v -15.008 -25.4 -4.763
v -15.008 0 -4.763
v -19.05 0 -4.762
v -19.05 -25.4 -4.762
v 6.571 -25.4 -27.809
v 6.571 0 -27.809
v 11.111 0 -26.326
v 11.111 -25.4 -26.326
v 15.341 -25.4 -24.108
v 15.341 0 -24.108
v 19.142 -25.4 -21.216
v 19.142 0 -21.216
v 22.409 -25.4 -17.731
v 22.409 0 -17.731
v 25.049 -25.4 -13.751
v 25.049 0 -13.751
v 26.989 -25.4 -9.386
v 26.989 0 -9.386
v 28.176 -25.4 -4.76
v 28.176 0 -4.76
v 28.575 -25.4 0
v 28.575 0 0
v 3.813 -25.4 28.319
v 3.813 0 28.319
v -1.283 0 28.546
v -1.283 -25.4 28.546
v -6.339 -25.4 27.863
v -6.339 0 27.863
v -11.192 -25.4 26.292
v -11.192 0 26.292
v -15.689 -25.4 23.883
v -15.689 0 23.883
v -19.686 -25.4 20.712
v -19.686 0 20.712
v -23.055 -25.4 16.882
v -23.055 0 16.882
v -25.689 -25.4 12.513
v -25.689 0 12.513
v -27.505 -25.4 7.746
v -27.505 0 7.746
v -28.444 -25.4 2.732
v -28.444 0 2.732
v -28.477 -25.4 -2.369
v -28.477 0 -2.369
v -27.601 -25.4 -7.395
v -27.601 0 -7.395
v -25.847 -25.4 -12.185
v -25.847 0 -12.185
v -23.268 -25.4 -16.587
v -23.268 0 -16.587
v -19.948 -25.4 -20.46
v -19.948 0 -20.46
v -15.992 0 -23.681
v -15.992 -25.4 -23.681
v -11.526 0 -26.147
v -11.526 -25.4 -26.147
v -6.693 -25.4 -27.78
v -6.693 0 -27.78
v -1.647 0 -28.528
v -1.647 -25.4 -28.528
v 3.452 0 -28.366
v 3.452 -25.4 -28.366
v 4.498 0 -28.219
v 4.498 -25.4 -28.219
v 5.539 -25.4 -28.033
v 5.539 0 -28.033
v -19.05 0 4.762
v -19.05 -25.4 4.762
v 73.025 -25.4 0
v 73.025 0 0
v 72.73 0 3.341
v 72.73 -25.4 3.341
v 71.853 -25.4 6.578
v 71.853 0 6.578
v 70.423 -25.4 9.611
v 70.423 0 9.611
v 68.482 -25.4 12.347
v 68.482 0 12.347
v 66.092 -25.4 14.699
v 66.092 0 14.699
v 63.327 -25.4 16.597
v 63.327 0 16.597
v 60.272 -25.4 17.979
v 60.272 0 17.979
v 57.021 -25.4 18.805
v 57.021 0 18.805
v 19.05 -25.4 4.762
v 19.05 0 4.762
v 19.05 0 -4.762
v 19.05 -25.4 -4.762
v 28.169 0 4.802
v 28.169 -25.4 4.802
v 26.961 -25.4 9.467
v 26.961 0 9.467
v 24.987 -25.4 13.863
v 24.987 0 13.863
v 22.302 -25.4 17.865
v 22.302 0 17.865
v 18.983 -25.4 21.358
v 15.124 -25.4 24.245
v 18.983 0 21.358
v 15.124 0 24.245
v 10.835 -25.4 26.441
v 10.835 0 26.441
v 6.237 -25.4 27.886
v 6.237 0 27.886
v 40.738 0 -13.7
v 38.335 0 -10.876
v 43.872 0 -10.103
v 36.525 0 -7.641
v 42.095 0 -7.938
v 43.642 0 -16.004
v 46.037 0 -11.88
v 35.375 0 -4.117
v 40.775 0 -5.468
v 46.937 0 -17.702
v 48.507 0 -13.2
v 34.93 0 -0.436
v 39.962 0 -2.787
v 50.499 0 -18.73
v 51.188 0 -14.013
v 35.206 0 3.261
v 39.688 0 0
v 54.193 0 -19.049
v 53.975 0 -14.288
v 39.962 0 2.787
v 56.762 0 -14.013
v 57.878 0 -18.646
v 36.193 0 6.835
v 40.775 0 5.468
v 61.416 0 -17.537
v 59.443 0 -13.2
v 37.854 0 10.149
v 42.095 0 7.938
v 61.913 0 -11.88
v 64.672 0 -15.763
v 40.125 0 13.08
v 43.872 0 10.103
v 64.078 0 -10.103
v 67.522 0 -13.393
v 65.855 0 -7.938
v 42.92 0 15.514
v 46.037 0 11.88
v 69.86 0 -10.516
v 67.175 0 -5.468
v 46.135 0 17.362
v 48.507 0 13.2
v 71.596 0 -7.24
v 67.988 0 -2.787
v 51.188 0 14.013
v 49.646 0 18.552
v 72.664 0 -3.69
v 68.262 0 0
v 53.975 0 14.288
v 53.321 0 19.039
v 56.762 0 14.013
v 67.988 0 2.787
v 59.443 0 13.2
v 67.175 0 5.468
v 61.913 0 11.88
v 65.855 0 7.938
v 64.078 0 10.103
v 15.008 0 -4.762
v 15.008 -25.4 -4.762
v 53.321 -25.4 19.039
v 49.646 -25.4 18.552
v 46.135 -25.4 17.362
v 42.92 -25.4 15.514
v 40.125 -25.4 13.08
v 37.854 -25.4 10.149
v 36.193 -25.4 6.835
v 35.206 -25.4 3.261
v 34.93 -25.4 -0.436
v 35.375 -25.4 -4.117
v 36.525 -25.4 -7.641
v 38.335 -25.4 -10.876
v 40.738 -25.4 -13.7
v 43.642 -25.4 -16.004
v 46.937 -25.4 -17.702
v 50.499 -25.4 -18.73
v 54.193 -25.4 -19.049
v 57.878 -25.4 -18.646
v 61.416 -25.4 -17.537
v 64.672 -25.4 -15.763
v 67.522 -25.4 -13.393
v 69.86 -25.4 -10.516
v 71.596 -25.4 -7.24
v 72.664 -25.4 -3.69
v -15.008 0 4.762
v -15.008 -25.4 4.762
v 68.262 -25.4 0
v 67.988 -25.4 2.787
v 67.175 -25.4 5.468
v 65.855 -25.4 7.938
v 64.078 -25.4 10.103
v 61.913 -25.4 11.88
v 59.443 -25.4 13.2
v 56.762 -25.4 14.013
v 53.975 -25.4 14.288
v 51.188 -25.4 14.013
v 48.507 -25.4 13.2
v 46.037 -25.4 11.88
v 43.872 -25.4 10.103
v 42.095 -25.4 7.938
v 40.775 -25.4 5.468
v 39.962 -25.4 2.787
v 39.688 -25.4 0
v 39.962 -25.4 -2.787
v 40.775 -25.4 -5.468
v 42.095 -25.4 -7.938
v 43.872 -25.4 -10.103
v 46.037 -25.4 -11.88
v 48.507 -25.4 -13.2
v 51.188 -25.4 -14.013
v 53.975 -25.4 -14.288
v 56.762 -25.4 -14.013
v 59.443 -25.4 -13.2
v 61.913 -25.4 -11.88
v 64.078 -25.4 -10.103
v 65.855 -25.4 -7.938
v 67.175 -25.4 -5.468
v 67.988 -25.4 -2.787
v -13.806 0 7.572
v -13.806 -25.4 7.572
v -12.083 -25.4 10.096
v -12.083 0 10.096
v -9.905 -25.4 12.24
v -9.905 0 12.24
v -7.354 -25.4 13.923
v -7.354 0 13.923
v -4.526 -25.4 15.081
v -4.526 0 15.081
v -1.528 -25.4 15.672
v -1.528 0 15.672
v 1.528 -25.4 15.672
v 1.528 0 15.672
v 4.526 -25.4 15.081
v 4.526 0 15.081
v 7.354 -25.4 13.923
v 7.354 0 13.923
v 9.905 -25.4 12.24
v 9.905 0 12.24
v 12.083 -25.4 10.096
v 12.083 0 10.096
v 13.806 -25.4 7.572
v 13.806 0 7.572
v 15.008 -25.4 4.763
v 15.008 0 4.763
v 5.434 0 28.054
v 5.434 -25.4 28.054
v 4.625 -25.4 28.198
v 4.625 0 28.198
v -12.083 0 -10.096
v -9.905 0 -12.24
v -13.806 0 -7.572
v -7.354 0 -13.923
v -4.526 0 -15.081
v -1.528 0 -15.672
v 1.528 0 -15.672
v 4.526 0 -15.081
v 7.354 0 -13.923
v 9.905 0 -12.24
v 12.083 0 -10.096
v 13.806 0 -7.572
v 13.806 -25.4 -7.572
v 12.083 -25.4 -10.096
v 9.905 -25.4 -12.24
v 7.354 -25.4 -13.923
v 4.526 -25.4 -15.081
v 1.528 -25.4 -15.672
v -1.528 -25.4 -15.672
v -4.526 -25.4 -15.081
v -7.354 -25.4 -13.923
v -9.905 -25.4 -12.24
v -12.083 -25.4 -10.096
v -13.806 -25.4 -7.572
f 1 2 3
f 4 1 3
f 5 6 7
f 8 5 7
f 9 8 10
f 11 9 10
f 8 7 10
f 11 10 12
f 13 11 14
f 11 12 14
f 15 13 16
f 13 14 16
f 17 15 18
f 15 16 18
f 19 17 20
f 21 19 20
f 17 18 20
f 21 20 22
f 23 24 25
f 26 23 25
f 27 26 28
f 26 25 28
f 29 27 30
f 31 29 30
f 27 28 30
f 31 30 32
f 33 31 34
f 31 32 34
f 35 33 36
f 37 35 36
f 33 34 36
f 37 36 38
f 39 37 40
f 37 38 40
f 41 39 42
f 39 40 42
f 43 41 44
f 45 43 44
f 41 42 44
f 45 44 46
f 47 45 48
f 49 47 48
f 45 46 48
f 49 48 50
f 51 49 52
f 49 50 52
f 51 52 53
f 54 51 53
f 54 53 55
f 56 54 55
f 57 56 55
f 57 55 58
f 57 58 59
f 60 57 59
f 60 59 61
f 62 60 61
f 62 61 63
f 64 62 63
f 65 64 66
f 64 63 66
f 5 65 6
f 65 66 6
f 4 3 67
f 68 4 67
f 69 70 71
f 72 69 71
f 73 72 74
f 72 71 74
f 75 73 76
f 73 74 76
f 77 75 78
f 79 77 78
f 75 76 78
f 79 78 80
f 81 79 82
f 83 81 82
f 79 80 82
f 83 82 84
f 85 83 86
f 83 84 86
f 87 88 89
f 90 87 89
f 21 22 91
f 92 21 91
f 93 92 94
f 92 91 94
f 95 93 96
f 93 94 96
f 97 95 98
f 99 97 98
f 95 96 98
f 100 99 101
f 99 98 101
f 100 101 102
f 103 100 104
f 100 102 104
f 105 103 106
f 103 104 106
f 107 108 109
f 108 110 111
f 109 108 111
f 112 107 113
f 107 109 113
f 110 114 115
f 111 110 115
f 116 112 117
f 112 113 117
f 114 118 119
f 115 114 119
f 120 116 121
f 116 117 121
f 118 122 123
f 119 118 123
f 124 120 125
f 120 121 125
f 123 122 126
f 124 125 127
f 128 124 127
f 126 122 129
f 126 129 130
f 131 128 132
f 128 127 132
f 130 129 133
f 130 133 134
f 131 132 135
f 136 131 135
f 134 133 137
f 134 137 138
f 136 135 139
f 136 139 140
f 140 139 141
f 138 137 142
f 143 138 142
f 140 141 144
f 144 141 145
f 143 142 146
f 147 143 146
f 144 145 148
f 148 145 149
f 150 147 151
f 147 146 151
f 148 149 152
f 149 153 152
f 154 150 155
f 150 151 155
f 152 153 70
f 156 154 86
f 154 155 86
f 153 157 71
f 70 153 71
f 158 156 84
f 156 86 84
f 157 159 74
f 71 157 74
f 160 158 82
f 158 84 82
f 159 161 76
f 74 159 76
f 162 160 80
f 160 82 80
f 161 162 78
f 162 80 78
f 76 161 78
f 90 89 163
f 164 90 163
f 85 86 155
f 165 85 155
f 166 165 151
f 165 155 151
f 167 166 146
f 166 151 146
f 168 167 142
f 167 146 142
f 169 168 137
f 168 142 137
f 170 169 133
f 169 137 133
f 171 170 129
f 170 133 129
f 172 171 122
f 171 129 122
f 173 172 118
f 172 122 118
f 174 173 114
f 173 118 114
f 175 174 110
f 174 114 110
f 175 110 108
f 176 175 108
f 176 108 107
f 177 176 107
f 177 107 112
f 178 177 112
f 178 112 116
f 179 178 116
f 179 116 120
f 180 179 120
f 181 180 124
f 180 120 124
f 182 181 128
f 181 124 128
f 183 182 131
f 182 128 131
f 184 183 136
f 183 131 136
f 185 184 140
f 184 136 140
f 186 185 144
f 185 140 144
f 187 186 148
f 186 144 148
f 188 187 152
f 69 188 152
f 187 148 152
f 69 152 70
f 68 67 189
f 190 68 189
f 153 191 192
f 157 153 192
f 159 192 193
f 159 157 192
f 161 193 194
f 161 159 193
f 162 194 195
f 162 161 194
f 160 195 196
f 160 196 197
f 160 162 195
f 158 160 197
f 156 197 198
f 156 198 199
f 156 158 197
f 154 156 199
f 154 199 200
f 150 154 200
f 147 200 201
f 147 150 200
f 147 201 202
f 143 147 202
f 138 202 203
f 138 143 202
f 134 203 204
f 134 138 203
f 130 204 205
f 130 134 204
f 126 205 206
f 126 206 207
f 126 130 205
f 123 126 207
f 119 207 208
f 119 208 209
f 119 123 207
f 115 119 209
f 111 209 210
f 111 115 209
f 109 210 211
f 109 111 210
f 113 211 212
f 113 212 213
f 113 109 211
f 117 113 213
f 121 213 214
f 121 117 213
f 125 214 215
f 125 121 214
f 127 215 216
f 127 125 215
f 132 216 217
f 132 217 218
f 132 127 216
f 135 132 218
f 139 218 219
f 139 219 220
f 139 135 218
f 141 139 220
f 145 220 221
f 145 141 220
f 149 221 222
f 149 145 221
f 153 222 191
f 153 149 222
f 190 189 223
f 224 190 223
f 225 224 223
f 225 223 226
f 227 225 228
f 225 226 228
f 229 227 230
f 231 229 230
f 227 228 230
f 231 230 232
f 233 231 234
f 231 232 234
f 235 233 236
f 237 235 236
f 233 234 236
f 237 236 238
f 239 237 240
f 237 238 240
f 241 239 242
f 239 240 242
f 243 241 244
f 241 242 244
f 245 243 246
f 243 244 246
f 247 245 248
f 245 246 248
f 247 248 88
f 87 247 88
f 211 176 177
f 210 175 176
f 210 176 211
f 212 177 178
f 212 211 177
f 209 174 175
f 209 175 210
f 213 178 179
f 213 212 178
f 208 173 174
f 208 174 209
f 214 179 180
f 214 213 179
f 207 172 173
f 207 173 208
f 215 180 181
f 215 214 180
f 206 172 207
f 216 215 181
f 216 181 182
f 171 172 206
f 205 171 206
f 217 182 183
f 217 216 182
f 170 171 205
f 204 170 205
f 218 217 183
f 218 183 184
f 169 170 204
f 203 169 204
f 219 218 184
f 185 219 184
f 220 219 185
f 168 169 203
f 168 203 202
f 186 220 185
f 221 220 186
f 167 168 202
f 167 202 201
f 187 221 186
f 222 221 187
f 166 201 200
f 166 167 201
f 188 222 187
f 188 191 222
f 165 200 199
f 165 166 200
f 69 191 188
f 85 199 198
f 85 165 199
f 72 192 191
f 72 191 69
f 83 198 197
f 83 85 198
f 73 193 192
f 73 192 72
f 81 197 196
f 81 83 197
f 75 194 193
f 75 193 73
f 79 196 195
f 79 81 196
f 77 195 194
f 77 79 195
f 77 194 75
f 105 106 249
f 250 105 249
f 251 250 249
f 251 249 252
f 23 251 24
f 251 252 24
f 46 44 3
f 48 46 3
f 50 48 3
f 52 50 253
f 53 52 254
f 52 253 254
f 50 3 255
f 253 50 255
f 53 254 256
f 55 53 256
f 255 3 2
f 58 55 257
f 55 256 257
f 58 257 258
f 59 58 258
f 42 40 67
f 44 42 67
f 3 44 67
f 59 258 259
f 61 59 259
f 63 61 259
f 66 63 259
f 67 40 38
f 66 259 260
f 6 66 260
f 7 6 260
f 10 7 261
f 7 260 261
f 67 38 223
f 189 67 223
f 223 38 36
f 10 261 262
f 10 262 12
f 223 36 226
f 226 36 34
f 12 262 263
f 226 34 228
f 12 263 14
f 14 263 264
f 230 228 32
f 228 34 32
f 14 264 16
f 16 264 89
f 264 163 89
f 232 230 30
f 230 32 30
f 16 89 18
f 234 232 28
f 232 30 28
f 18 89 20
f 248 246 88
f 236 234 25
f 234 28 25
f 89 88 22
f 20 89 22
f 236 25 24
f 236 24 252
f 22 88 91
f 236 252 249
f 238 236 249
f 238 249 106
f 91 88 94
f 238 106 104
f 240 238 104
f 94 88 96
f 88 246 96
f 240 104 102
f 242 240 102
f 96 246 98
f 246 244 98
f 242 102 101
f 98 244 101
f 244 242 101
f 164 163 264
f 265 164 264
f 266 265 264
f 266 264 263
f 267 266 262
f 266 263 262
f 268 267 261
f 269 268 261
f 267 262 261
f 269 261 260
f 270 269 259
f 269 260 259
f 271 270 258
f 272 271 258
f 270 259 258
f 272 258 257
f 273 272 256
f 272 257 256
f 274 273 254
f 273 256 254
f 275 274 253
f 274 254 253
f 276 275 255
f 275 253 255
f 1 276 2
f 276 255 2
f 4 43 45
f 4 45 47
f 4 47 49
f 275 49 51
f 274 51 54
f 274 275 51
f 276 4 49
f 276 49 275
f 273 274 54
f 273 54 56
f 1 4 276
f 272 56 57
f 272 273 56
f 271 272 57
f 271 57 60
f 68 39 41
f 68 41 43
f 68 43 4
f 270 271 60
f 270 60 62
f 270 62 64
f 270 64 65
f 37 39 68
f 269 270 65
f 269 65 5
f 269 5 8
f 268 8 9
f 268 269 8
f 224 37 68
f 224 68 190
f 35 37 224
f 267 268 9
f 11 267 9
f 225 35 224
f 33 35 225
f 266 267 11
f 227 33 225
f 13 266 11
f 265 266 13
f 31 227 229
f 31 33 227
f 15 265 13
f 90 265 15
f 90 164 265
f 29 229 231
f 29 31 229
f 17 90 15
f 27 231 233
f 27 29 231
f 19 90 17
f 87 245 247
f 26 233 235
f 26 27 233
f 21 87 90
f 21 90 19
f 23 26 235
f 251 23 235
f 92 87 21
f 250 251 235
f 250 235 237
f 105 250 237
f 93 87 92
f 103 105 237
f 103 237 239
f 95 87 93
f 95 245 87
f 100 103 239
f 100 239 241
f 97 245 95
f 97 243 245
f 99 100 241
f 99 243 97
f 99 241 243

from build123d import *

# Parameters (mm, degrees)
F0_R     = 14.2875
F1_DEPTH = 25.4


with BuildPart() as f1:
    # F0 (on Front) → F1 (new body)
    with BuildSketch(Plane.XZ):
        with BuildLine():
            Line((6.237397, 27.885937), (3.813149, 28.319437))
            ThreePointArc((3.813149, 28.319437), (-28.574421, 0.181936), (3.452229, -28.365697))
            Line((3.452229, -28.365697), (6.571103, -27.809193))
            ThreePointArc((6.571103, -27.809193), (22.408703, -17.730783), (28.575, 0))
            ThreePointArc((28.575, 0), (22.302065, 17.864728), (6.237397, 27.885937))
        make_face()
        with BuildLine():
            ThreePointArc((-15.008458, 4.7625), (0, 15.745959), (15.008458, 4.7625))
            Line((15.008458, 4.7625), (19.05, 4.7625))
            Line((19.05, 4.7625), (19.05, -4.7625))
            Line((19.05, -4.7625), (15.008458, -4.7625))
            ThreePointArc((15.008458, -4.7625), (0, -15.745959), (-15.008458, -4.7625))
            Line((-15.008458, -4.7625), (-19.05, -4.7625))
            Line((-19.05, -4.7625), (-19.05, 4.7625))
            Line((-19.05, 4.7625), (-15.008458, 4.7625))
        make_face(mode=Mode.SUBTRACT)
        with BuildLine():
            ThreePointArc((73.025, 0), (68.482388, 12.346586), (57.02099, 18.804905))
            ThreePointArc((57.02099, 18.804905), (39.467612, -12.346586), (73.025, 0))
        make_face()
        with Locations((53.975, 0)):
            Circle(F0_R, mode=Mode.SUBTRACT)
        with BuildLine():
            ThreePointArc((6.237397, 27.885937), (5.029945, 28.128816), (3.813149, 28.319437))
            Line((3.813149, 28.319437), (6.237397, 27.885937))
        make_face()
        with BuildLine():
            Line((6.571103, -27.809193), (3.452229, -28.365697))
            ThreePointArc((3.452229, -28.365697), (5.019384, -28.130702), (6.571103, -27.809193))
        make_face()
    extrude(amount=F1_DEPTH)


solid = f1.part
